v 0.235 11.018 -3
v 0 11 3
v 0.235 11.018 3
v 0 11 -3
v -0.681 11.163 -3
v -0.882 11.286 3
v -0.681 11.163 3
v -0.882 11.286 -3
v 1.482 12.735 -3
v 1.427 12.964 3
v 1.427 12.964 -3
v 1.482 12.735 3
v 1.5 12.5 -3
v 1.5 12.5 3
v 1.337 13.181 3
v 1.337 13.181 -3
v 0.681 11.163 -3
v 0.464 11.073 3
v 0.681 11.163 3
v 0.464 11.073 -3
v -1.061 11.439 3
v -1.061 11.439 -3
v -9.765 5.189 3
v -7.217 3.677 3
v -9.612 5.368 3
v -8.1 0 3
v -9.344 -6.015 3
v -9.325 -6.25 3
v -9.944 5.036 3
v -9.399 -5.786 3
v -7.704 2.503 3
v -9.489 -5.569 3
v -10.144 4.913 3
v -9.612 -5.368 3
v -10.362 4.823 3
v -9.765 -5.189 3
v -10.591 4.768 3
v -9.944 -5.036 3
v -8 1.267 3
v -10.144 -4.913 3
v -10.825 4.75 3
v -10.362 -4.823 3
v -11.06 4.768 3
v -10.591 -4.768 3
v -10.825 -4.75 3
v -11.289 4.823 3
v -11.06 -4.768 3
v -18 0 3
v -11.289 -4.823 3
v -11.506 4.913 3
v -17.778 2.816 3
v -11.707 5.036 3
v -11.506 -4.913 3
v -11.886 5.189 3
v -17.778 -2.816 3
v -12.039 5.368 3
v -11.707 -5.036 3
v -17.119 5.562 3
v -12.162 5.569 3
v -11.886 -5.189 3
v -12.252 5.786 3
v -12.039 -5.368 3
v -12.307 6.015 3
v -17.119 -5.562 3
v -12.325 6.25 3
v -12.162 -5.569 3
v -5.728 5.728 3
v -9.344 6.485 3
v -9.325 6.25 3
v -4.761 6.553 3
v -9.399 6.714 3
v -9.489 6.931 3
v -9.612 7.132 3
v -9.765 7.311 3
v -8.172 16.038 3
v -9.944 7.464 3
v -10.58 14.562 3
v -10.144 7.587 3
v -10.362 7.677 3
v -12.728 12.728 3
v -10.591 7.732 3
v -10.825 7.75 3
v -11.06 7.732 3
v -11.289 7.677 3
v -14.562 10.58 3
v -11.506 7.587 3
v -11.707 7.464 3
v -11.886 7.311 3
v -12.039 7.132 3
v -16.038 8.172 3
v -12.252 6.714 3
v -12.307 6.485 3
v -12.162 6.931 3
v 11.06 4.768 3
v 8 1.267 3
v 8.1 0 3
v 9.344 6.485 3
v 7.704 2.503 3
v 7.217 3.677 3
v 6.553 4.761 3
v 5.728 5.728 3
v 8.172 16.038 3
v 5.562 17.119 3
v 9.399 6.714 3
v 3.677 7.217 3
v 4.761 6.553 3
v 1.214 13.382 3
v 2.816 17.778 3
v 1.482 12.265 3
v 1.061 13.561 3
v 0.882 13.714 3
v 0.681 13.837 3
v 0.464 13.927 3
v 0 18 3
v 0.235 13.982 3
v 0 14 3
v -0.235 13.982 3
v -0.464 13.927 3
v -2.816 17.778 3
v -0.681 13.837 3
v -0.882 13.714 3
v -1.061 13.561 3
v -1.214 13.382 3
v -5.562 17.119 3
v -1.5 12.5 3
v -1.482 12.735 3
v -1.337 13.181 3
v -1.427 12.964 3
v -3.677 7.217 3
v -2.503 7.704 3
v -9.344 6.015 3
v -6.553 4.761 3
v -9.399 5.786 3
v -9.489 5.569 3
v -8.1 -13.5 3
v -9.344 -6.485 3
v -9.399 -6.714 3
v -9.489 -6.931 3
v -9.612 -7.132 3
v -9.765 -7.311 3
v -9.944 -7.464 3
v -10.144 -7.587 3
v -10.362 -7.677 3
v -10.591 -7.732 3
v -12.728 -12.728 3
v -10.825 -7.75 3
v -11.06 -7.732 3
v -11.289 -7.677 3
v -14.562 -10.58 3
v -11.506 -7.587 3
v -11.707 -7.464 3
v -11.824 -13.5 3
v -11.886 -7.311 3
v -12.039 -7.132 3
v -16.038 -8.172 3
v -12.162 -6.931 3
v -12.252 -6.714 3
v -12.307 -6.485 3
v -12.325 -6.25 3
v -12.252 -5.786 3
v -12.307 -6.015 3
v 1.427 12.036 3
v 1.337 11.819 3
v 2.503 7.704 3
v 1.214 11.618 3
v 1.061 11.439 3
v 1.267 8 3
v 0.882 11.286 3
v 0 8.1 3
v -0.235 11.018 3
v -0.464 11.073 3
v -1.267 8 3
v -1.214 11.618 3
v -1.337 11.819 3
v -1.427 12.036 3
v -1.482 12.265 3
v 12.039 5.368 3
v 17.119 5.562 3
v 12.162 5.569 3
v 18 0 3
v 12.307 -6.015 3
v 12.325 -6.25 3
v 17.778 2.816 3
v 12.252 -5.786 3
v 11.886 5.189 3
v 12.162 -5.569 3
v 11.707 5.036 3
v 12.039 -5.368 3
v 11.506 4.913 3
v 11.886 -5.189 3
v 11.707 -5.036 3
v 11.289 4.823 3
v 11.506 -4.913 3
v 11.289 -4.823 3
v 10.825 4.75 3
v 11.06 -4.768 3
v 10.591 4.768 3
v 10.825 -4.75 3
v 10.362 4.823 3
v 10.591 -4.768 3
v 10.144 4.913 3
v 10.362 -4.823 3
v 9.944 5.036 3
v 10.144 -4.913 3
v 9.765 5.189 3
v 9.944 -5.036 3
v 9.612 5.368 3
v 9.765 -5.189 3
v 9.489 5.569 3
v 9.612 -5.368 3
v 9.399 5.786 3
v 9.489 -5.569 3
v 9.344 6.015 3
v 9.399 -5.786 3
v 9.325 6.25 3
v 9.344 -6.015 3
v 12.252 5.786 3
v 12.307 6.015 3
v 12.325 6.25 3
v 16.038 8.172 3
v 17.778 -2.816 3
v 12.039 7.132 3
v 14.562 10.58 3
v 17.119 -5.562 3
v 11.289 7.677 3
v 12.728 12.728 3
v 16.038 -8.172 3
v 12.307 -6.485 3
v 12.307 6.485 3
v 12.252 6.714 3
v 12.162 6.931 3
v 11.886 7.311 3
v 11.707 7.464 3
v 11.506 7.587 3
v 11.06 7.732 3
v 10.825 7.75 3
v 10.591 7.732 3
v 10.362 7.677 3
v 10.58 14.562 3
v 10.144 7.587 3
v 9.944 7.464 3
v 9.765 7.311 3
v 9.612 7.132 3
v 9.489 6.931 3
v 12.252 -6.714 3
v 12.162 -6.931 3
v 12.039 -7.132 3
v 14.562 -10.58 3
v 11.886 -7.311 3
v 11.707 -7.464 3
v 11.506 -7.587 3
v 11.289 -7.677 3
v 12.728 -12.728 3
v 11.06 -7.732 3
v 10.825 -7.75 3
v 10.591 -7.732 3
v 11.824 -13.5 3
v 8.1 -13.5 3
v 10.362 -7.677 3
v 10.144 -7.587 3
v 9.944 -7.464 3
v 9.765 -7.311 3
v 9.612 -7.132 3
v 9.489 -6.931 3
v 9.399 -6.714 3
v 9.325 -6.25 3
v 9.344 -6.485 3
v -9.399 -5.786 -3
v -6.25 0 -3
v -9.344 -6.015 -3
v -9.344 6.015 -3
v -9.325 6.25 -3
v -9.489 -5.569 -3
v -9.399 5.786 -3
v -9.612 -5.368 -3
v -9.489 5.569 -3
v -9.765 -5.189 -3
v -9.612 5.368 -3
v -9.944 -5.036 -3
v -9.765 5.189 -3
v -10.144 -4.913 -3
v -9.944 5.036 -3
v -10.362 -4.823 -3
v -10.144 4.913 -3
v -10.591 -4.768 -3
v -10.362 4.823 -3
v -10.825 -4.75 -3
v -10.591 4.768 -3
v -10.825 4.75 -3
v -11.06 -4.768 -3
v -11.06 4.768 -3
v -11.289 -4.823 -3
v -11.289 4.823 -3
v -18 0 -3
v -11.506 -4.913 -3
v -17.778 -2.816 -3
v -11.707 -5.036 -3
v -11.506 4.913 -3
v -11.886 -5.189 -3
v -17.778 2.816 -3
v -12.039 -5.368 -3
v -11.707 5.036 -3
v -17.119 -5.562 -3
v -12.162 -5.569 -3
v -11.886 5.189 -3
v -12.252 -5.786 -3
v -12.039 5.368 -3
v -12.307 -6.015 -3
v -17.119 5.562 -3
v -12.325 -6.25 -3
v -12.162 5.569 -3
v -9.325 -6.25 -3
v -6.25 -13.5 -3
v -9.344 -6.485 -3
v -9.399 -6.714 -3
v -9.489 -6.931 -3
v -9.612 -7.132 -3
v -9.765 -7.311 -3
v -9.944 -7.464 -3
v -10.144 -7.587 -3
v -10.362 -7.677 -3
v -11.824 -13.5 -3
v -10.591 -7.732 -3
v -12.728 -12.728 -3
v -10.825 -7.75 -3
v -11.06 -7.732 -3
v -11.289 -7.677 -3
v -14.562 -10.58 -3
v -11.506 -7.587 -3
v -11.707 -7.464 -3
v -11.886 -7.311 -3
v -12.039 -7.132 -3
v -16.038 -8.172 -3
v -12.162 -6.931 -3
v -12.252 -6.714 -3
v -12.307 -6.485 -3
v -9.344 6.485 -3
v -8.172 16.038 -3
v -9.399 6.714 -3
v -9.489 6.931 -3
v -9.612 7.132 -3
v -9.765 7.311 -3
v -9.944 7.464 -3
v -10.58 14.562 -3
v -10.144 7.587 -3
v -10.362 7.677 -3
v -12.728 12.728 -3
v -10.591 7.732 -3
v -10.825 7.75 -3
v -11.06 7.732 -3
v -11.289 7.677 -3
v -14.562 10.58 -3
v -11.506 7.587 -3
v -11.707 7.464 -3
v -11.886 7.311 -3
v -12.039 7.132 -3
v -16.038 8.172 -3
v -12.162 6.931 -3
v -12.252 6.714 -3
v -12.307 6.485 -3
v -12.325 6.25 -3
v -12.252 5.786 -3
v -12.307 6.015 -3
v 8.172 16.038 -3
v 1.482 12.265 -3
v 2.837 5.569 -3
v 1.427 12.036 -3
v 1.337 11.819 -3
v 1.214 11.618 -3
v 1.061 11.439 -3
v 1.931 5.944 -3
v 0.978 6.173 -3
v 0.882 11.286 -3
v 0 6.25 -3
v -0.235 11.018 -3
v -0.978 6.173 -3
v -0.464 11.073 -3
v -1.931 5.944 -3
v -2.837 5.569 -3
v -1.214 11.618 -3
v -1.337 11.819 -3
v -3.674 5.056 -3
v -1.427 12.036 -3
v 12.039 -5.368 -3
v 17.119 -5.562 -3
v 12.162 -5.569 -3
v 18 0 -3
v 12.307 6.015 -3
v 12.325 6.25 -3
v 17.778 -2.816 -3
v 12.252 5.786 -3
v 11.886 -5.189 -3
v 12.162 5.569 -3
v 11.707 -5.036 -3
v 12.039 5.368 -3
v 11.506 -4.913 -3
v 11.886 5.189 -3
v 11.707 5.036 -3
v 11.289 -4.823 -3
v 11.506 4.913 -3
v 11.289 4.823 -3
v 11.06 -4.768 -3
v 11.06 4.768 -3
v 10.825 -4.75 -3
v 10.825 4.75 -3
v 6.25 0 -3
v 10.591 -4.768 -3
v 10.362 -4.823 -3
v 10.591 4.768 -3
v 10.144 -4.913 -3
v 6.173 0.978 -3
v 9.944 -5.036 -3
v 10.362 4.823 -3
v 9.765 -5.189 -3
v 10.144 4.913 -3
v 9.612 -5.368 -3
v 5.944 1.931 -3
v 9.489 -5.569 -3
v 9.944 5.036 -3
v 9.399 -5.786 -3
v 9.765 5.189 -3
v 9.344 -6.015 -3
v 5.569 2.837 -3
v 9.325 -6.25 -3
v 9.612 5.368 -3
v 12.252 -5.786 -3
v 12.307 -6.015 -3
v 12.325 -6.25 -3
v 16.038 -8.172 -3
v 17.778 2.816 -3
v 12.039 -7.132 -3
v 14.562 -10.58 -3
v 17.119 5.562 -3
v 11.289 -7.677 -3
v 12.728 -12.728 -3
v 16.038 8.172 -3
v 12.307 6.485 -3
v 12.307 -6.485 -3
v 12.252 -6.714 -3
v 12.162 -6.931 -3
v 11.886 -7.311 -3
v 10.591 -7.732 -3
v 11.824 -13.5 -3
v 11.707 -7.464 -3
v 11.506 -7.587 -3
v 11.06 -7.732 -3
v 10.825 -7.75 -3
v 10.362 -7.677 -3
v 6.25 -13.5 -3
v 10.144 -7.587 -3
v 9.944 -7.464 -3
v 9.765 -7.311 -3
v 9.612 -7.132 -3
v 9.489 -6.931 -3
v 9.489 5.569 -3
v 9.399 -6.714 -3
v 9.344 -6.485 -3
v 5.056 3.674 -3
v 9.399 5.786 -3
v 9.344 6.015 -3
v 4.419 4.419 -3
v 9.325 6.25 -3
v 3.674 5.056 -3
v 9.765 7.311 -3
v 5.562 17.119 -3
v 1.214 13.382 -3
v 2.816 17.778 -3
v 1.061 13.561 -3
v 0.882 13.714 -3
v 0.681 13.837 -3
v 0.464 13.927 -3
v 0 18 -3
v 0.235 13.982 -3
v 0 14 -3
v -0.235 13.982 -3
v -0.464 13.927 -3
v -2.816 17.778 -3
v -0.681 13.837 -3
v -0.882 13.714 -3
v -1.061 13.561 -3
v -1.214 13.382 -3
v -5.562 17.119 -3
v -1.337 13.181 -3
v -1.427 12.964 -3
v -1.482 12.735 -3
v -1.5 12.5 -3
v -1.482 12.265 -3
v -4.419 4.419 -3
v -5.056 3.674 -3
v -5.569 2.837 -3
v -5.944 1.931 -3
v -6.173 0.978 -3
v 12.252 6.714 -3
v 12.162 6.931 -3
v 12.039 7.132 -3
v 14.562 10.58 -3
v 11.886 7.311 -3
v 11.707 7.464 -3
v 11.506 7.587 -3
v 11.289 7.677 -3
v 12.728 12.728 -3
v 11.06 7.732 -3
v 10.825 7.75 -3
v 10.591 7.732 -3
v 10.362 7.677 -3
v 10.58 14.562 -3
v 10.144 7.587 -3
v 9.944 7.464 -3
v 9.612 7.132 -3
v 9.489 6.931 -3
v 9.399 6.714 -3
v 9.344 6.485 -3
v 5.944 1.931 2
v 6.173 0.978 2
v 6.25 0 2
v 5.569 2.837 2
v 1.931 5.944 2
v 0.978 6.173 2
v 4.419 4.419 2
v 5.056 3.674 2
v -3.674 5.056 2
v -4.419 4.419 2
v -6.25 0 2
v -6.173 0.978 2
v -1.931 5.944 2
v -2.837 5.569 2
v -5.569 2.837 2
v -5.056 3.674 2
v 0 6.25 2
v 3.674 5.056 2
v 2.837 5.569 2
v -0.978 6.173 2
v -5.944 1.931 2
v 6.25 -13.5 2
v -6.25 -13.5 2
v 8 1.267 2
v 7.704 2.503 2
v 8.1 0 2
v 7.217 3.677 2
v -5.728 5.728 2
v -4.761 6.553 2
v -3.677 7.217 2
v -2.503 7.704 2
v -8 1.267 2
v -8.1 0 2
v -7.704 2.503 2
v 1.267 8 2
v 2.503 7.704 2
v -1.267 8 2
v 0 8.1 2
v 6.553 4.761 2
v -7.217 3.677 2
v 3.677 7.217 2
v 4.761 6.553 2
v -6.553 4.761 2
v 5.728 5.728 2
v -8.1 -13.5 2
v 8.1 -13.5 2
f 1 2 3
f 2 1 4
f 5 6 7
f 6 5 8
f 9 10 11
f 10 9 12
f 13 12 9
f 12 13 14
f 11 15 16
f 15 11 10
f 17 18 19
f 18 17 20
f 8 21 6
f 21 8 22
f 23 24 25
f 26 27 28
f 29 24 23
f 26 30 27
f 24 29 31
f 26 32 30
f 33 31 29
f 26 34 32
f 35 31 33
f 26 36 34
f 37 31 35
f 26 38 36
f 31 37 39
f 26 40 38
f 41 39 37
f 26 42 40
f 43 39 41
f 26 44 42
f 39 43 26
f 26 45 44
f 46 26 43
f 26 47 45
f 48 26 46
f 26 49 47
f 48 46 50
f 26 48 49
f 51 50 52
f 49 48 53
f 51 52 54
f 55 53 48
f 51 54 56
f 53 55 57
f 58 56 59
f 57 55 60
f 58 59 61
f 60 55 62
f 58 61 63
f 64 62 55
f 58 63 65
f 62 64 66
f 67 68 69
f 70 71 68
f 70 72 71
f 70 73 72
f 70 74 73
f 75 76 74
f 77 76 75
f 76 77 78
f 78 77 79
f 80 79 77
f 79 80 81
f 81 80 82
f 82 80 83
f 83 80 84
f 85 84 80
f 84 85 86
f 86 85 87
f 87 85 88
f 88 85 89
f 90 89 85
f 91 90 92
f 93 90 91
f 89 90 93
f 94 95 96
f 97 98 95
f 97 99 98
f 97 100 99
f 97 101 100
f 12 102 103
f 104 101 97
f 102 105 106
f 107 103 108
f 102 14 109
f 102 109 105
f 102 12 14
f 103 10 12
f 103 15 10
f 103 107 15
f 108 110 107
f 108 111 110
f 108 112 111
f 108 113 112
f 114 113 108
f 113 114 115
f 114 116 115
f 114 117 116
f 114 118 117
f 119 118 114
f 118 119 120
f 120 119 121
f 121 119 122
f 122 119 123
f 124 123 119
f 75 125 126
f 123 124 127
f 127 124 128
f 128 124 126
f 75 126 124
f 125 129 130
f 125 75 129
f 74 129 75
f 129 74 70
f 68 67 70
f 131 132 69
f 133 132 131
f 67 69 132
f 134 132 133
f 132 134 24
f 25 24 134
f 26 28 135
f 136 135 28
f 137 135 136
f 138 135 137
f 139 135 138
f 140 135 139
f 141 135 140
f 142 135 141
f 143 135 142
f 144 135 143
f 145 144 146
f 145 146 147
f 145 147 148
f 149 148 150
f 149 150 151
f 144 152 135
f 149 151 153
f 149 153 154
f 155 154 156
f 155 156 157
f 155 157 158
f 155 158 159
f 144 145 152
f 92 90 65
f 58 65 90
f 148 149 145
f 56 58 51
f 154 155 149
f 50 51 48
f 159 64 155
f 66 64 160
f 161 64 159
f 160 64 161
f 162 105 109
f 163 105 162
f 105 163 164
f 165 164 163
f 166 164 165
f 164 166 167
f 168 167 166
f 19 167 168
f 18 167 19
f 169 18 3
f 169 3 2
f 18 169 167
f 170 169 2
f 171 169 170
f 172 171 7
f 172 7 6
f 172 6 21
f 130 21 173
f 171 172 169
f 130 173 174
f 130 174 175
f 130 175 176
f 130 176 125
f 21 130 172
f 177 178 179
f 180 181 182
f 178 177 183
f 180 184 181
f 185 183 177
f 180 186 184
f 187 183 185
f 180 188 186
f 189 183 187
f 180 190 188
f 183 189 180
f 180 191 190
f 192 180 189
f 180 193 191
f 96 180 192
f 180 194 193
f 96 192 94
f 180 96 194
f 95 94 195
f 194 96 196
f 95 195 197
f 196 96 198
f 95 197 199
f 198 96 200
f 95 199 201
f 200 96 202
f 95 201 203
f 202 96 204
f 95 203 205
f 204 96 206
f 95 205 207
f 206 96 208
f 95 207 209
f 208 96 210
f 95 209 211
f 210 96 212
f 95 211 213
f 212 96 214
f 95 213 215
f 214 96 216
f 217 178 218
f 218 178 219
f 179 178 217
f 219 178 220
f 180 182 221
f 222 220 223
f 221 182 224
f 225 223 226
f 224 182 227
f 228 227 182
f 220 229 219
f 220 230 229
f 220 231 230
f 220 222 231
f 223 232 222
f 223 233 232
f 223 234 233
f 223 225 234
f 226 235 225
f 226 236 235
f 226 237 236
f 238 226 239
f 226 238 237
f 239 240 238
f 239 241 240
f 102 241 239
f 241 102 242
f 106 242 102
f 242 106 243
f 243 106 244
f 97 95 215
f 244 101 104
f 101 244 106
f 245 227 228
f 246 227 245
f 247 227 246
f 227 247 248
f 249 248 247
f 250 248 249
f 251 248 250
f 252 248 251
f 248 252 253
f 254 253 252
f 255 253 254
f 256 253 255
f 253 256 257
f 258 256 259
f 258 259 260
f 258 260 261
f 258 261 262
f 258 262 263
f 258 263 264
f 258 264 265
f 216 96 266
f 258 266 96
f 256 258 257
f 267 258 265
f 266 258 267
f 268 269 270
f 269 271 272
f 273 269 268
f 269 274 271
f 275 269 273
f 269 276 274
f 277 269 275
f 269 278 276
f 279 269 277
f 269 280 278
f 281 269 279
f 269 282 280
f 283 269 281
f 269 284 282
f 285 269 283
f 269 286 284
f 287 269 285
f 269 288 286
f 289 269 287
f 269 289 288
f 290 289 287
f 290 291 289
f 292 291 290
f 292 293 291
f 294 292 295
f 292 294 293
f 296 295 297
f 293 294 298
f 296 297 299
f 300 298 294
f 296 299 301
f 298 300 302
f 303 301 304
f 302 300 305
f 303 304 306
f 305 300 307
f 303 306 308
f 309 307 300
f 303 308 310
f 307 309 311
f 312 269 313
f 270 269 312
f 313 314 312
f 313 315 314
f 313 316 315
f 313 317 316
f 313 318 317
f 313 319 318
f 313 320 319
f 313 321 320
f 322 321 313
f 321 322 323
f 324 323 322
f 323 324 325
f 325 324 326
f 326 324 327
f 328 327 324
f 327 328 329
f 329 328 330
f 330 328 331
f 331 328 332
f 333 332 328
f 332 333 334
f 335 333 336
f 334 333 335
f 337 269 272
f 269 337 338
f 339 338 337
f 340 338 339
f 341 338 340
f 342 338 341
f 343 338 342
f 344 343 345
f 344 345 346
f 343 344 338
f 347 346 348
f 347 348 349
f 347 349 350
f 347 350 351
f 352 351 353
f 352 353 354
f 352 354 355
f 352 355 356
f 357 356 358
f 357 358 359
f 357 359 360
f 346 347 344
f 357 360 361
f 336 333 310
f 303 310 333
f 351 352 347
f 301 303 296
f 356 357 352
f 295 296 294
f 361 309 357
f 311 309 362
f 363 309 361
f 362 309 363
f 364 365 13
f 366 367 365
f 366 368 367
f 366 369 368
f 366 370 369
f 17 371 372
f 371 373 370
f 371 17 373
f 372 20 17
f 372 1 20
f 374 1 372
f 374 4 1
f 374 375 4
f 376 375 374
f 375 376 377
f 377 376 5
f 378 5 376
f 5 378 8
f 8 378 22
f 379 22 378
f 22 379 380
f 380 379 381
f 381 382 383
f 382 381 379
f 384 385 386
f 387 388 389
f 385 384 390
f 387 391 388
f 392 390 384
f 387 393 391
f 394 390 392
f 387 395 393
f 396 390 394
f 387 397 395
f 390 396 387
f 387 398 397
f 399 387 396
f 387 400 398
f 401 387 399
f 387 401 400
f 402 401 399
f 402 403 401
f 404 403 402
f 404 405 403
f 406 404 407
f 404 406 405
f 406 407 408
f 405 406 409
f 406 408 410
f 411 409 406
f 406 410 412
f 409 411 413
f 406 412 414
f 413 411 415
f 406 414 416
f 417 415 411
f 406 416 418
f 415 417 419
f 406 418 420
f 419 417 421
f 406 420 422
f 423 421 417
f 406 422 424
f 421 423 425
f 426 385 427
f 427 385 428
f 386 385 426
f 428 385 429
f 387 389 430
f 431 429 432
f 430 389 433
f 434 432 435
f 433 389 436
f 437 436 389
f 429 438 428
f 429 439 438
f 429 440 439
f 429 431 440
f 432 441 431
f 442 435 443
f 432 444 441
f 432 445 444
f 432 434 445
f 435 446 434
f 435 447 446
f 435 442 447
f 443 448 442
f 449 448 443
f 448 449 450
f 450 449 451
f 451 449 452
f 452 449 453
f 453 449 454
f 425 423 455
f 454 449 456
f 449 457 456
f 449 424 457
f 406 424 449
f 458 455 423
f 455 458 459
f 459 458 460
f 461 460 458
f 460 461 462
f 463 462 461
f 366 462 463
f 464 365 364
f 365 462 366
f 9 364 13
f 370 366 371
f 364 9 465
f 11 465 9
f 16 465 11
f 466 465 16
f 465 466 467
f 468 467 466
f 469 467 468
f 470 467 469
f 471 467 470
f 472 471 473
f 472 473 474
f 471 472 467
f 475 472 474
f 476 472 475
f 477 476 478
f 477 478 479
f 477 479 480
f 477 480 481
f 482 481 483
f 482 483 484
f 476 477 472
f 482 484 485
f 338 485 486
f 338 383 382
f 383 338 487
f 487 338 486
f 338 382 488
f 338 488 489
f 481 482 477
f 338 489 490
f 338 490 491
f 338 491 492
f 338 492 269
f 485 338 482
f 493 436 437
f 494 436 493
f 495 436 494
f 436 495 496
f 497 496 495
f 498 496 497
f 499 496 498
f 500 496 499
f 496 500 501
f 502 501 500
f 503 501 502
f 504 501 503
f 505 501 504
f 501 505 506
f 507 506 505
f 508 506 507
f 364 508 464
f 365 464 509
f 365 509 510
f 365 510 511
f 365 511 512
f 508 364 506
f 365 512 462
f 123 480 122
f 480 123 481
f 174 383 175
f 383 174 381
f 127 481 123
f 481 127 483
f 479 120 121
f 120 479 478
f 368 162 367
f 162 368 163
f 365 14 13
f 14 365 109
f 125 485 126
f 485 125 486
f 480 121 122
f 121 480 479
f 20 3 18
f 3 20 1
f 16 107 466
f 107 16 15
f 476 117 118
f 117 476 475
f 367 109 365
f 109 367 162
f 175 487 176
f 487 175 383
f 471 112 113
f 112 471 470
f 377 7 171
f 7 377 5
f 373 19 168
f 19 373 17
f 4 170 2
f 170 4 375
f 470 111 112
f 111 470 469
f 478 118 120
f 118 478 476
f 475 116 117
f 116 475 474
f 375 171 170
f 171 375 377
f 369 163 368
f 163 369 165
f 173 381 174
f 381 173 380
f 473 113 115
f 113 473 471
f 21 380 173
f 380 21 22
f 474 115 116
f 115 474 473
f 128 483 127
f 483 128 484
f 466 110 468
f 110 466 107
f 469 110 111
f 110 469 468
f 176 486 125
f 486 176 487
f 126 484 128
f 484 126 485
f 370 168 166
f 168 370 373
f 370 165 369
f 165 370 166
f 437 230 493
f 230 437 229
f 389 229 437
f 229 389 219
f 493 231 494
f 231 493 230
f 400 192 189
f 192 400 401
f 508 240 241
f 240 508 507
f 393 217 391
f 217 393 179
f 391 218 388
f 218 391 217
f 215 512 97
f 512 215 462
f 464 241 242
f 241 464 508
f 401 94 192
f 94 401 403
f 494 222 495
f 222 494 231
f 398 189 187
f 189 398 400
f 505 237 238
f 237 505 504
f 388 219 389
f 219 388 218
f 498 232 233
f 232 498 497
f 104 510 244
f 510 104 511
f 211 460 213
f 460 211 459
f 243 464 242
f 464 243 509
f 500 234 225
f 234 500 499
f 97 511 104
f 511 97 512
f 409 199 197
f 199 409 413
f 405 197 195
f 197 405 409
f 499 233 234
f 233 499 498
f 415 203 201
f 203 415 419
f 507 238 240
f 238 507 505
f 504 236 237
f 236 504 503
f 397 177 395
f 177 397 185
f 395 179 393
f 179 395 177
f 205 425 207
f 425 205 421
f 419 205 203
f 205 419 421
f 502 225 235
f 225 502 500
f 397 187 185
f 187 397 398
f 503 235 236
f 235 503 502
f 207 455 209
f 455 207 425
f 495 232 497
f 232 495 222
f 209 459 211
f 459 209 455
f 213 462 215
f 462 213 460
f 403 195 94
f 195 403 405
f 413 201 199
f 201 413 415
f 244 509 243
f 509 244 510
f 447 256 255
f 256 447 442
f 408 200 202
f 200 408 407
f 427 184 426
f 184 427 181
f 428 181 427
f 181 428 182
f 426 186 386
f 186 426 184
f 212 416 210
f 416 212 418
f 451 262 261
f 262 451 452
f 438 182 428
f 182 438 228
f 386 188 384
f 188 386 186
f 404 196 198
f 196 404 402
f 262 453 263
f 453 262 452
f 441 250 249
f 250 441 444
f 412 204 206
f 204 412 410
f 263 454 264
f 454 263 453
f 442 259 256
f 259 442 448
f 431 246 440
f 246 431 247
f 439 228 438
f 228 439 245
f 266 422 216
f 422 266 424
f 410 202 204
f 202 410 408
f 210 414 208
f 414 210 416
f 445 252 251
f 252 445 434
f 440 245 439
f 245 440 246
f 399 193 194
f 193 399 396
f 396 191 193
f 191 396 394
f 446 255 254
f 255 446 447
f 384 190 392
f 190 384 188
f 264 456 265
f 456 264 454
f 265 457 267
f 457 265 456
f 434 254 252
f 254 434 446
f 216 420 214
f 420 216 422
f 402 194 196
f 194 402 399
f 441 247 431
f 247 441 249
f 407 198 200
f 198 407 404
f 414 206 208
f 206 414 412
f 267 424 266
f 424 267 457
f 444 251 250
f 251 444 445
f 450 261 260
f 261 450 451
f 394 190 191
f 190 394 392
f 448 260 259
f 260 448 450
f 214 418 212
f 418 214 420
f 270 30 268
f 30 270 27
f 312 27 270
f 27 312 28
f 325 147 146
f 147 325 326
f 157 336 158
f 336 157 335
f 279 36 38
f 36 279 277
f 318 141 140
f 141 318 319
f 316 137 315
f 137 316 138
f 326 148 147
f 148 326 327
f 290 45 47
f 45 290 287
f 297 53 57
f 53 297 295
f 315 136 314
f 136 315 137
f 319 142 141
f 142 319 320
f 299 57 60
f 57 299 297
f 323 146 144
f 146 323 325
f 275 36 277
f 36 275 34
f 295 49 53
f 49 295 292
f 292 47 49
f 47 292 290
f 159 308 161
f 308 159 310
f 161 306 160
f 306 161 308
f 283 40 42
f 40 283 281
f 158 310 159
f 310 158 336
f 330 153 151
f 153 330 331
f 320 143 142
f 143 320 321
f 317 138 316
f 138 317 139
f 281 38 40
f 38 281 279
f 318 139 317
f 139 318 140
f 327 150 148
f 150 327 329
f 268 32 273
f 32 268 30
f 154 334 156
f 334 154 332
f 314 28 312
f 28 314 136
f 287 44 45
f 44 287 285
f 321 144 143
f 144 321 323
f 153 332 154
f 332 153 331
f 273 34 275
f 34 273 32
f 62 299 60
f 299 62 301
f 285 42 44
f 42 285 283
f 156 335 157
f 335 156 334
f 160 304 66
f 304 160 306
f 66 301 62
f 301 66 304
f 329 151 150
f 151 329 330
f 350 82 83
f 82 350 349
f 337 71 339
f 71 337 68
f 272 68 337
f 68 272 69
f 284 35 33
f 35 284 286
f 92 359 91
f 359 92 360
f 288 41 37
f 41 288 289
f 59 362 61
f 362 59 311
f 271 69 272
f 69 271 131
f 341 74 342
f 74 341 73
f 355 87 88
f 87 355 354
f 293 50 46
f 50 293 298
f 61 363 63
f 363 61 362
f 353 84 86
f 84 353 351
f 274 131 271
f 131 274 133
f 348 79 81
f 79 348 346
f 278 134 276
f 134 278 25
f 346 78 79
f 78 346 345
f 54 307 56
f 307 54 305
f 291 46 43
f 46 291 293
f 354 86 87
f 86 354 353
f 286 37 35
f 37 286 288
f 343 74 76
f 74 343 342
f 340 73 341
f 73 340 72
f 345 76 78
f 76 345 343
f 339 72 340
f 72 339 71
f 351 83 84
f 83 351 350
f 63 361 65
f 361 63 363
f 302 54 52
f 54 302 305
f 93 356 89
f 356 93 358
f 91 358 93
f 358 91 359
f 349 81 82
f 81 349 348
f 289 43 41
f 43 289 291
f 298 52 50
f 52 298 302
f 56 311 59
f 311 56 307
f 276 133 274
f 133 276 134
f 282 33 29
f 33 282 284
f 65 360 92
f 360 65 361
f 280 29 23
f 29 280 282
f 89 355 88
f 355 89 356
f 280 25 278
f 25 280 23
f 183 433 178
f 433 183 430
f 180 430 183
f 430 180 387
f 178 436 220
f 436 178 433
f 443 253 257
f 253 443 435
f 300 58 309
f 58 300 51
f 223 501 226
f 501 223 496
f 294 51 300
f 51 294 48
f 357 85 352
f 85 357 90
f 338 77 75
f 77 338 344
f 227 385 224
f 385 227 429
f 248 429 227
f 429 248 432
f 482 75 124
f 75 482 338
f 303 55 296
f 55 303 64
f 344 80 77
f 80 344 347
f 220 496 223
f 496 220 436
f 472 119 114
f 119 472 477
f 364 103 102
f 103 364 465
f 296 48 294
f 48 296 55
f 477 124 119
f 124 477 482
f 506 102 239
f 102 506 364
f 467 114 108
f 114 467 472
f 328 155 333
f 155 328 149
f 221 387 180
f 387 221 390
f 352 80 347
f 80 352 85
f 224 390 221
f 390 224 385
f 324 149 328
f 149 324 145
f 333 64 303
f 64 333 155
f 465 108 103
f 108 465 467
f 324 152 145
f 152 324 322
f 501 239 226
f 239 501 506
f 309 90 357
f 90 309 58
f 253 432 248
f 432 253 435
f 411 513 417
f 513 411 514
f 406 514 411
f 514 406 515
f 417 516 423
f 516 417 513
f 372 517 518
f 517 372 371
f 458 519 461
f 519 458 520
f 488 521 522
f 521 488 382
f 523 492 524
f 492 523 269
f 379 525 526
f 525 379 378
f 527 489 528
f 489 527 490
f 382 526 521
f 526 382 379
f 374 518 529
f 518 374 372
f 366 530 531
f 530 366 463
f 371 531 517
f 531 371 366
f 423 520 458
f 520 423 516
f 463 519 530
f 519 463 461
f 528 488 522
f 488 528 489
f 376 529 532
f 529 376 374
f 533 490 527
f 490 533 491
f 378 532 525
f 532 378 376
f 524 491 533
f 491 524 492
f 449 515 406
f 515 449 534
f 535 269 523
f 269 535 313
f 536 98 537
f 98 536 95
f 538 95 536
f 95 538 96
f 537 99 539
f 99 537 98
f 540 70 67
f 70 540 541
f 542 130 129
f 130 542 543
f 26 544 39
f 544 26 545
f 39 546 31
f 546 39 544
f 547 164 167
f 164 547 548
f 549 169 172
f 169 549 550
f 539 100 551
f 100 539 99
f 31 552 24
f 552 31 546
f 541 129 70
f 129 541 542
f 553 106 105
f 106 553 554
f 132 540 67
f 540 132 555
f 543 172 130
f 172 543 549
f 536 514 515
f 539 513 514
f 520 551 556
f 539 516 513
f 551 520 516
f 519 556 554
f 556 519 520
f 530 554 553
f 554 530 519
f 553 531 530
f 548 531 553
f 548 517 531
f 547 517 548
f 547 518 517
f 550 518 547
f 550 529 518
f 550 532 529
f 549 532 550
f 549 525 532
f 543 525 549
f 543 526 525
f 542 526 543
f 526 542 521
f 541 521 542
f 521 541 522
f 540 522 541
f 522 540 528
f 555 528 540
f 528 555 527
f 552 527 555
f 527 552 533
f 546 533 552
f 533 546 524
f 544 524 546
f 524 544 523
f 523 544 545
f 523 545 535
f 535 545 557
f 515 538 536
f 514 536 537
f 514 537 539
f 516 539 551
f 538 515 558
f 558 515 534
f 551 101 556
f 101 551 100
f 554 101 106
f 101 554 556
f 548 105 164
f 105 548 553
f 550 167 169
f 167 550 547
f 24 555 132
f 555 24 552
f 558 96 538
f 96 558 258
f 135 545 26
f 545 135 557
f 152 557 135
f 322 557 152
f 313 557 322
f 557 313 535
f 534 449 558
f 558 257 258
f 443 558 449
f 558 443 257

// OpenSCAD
m3_wide_radius = 1.5;

// Overall mount dimensions
mount_radius = 18;
mount_thickness = 6;

// Through holes
hole_radius = 12.5;

// Slot and lip for installation
slot_radius = 6.25;
lip_radius = 8.1;
lip_thickness = 1;

$fn = 40;

difference() {
  cylinder(r=mount_radius, h=mount_thickness, center=true);

  // Thru holes
  for (hole_angle = [0:60:360]) {
    translate([sin(hole_angle)*hole_radius,cos(hole_angle)*hole_radius,0]) cylinder(r=m3_wide_radius, h=mount_thickness, center=true);
  }

  // Thru slot
  cylinder(r=slot_radius, h=mount_thickness, center=true);
  translate([0, -mount_radius/2, 0]) cube([2*slot_radius, mount_radius, mount_thickness], center=true);

  // Lip 
  translate([0, 0, (mount_thickness-lip_thickness)/2]) cylinder(r=lip_radius, h=lip_thickness, center=true);
  translate([0, -mount_radius/2, (mount_thickness-lip_thickness)/2]) cube([2*lip_radius, mount_radius, lip_thickness], center=true);

  // Cut off the sharp edges at the front
  translate([0, -7/4*mount_radius, 0]) cube([2*mount_radius, 2*mount_radius, mount_thickness], center=true);
};
